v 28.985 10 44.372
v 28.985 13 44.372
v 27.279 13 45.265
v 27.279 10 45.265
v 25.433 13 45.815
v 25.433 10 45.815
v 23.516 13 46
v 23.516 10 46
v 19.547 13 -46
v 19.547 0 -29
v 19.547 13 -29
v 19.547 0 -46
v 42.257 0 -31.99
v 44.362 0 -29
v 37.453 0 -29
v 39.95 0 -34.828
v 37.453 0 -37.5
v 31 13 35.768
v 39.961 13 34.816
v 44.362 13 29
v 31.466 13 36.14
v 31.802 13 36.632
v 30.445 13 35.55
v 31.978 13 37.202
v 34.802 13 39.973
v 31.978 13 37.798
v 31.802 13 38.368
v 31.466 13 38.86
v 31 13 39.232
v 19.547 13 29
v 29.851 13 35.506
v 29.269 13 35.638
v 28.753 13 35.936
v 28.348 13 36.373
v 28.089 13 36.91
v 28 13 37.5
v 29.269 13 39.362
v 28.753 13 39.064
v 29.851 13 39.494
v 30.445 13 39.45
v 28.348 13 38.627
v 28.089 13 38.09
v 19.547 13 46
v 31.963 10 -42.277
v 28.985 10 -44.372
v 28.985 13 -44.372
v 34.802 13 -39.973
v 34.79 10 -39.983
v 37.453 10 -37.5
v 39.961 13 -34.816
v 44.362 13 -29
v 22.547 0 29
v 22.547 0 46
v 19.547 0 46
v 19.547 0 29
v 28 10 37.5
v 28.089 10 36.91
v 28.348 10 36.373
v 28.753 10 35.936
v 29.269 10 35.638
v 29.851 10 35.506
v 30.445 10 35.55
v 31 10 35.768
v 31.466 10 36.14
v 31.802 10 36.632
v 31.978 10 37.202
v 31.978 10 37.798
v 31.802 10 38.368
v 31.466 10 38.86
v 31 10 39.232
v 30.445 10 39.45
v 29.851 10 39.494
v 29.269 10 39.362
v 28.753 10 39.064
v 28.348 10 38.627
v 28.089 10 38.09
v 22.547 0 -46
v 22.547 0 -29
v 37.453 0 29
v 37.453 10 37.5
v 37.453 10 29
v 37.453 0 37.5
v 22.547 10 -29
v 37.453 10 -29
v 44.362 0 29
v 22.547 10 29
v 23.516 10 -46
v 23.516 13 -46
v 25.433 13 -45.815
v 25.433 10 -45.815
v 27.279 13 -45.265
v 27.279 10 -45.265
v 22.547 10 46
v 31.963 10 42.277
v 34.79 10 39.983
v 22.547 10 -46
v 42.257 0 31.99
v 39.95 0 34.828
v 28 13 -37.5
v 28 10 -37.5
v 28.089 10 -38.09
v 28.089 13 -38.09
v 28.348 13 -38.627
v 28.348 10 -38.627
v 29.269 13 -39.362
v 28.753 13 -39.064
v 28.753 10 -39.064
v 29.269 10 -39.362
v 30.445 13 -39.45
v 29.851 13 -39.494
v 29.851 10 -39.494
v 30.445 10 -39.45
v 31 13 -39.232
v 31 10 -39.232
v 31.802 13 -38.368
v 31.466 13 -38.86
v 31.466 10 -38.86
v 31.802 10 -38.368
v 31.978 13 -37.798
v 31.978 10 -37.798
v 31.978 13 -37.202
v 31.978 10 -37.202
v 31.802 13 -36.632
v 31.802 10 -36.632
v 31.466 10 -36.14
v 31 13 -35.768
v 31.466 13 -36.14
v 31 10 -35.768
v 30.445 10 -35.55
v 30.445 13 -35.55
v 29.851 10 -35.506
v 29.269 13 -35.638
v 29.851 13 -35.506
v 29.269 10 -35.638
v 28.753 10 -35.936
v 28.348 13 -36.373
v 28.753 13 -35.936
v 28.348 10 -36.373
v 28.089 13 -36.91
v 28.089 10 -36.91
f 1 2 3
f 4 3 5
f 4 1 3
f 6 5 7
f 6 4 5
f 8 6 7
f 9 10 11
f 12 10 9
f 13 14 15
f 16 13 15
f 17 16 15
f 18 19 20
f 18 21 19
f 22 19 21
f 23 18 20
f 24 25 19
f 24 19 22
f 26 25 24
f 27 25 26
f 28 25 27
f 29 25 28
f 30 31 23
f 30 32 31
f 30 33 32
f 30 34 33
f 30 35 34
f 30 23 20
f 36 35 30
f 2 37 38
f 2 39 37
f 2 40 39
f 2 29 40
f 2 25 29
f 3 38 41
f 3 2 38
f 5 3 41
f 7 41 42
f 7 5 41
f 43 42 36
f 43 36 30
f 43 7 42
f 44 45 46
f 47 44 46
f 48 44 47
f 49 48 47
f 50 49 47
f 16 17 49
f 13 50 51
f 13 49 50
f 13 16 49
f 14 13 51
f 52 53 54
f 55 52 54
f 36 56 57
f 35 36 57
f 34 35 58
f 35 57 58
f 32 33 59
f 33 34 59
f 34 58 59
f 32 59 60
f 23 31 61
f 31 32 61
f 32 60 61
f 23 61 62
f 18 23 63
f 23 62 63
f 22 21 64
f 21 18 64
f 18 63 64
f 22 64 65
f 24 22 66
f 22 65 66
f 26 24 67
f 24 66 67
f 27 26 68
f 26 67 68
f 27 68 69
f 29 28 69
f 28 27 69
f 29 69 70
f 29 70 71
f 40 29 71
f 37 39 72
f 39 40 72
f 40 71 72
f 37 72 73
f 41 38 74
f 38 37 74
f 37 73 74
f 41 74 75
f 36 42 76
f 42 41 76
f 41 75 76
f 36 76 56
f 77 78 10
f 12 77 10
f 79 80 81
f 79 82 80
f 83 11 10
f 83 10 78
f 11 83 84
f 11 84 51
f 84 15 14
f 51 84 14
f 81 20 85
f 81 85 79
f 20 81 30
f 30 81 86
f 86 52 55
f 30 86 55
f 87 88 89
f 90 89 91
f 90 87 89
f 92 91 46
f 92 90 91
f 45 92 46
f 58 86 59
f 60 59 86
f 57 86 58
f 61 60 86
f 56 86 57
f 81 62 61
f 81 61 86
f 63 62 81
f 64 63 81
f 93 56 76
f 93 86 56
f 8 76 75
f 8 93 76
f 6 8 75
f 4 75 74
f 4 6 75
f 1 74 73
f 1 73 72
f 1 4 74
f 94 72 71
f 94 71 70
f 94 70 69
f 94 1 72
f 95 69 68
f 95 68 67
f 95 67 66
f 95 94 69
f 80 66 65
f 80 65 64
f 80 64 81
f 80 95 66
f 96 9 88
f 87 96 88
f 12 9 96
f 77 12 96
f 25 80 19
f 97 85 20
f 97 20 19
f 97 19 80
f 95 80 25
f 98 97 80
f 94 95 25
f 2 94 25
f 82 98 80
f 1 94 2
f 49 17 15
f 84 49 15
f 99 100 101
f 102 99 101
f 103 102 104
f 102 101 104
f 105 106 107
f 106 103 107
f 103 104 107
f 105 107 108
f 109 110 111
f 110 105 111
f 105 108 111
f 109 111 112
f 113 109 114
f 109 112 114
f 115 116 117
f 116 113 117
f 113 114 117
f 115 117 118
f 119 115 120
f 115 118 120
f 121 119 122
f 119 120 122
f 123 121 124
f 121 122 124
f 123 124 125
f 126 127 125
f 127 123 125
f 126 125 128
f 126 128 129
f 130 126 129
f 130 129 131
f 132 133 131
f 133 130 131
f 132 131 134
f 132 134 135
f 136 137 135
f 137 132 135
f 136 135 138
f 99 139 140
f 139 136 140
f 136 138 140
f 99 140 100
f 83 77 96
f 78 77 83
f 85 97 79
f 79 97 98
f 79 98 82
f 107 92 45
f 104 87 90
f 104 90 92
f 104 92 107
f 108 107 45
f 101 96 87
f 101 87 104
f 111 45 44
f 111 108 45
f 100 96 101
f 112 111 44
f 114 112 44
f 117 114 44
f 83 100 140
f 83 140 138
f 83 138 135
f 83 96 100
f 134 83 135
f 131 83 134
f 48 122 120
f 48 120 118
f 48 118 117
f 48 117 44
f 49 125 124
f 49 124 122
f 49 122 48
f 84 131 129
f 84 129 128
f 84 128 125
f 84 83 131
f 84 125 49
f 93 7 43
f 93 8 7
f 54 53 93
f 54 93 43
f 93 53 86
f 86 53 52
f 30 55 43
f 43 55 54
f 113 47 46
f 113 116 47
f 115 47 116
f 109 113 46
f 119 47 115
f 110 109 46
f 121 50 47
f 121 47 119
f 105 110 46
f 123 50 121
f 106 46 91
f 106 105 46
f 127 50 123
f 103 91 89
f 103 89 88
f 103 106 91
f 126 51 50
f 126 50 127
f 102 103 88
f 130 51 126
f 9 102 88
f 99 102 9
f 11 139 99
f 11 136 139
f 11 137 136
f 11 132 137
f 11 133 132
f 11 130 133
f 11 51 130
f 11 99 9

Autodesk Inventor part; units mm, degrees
ref_plane "YZ Plane" through (0, 0, 0) normal (1, 0, 0) x (0, 1, 0)
ref_plane "XZ Plane" through (0, 0, 0) normal (0, 1, 0) x (-1, 0, 0)
ref_plane "XY Plane" through (0, 0, 0) normal (0, 0, 1) x (1, 0, 0)
sketch "Sketch1" plane through (0, 0, 0) normal (0, 1, 0) x (-1, 0, 0)
  arc A0 (-44.3621, -29) -> (-28.9848, -44.3721) centre (0, 0) ccw
  arc A1 (-28.9848, -44.3721) -> (-23.516, -46) centre (-23.516, -36) ccw
  line L0 (-23.516, -46) -> (-22.5467, -46)
  circle A2 centre (-30, -37.5) radius 2
  line L1 (-22.5467, -37.5) -> (-22.5467, -46)
  line L2 (-22.5467, -29) -> (-44.3621, -29)
  line L3 (-22.5467, -29) -> (-19.5467, -29)
  line L4 (-19.5467, -29) -> (-19.5467, -46)
  line L5 (-19.5467, -46) -> (-22.5467, -46)
  line L6 (0, 0) -> (-2.4935, 0)
  arc A3 (-28.9848, 44.3721) -> (-44.3621, 29) centre (0, 0) ccw
  line L7 (-23.516, 46) -> (-22.5467, 46)
  arc A4 (-23.516, 46) -> (-28.9848, 44.3721) centre (-23.516, 36) ccw
  circle A5 centre (-30, 37.5) radius 2
  line L8 (-22.5467, 37.5) -> (-22.5467, 46)
  line L9 (-22.5467, 29) -> (-44.3621, 29)
  line L10 (-22.5467, 29) -> (-19.5467, 29)
  line L11 (-19.5467, 29) -> (-19.5467, 46)
  line L12 (-19.5467, 46) -> (-22.5467, 46)
  dimension "d0" = 3
extrude "Extrusion1" add sketch "Sketch1" along normal blind 13
sketch "Sketch2" plane through (0, 0, 0) normal (0, -1, 0) x (1, 0, 0)
  circle A0 centre (30, 37.5) radius 2
  arc A1 (44.3621, 29) -> (28.9848, 44.3721) centre (0, 0) ccw
  arc A2 (28.9848, 44.3721) -> (23.516, 46) centre (23.516, 36) ccw
  line L0 (19.5467, 46) -> (23.516, 46)
  line L1 (19.5467, 29) -> (19.5467, 46)
  line L2 (44.3621, 29) -> (19.5467, 29)
  line L3 (44.3621, 29) -> (19.5467, 29) projected
  line L4 (19.5467, 46) -> (22.5467, 46)
  line L5 (22.5467, 46) -> (22.5467, 29)
  line L6 (22.5467, 29) -> (19.5467, 29)
  line L7 (19.5467, 29) -> (19.5467, 46)
  line L8 (37.4533, 37.5) -> (37.4533, 29)
  line L9 (0, 0) -> (2.6946, 0)
  circle A3 centre (30, -37.5) radius 2
  arc A4 (28.9848, -44.3721) -> (44.3621, -29) centre (0, 0) ccw
  arc A5 (23.516, -46) -> (28.9848, -44.3721) centre (23.516, -36) ccw
  line L10 (19.5467, -46) -> (23.516, -46)
  line L11 (19.5467, -29) -> (19.5467, -46)
  line L12 (44.3621, -29) -> (19.5467, -29)
  line L13 (44.3621, -29) -> (19.5467, -29)
  line L14 (19.5467, -46) -> (22.5467, -46)
  line L15 (22.5467, -46) -> (22.5467, -29)
  line L16 (22.5467, -29) -> (19.5467, -29)
  line L17 (19.5467, -29) -> (19.5467, -46)
  line L18 (37.4533, -37.5) -> (37.4533, -29)
  dimension "d3" = 3
extrude "Extrusion2" cut sketch "Sketch2" against normal blind 10 contours L8 L2 L5 L0 A2 A1 | A5 L10 L15 L12 L18 A4
properties part number "Left Standoff Support"
